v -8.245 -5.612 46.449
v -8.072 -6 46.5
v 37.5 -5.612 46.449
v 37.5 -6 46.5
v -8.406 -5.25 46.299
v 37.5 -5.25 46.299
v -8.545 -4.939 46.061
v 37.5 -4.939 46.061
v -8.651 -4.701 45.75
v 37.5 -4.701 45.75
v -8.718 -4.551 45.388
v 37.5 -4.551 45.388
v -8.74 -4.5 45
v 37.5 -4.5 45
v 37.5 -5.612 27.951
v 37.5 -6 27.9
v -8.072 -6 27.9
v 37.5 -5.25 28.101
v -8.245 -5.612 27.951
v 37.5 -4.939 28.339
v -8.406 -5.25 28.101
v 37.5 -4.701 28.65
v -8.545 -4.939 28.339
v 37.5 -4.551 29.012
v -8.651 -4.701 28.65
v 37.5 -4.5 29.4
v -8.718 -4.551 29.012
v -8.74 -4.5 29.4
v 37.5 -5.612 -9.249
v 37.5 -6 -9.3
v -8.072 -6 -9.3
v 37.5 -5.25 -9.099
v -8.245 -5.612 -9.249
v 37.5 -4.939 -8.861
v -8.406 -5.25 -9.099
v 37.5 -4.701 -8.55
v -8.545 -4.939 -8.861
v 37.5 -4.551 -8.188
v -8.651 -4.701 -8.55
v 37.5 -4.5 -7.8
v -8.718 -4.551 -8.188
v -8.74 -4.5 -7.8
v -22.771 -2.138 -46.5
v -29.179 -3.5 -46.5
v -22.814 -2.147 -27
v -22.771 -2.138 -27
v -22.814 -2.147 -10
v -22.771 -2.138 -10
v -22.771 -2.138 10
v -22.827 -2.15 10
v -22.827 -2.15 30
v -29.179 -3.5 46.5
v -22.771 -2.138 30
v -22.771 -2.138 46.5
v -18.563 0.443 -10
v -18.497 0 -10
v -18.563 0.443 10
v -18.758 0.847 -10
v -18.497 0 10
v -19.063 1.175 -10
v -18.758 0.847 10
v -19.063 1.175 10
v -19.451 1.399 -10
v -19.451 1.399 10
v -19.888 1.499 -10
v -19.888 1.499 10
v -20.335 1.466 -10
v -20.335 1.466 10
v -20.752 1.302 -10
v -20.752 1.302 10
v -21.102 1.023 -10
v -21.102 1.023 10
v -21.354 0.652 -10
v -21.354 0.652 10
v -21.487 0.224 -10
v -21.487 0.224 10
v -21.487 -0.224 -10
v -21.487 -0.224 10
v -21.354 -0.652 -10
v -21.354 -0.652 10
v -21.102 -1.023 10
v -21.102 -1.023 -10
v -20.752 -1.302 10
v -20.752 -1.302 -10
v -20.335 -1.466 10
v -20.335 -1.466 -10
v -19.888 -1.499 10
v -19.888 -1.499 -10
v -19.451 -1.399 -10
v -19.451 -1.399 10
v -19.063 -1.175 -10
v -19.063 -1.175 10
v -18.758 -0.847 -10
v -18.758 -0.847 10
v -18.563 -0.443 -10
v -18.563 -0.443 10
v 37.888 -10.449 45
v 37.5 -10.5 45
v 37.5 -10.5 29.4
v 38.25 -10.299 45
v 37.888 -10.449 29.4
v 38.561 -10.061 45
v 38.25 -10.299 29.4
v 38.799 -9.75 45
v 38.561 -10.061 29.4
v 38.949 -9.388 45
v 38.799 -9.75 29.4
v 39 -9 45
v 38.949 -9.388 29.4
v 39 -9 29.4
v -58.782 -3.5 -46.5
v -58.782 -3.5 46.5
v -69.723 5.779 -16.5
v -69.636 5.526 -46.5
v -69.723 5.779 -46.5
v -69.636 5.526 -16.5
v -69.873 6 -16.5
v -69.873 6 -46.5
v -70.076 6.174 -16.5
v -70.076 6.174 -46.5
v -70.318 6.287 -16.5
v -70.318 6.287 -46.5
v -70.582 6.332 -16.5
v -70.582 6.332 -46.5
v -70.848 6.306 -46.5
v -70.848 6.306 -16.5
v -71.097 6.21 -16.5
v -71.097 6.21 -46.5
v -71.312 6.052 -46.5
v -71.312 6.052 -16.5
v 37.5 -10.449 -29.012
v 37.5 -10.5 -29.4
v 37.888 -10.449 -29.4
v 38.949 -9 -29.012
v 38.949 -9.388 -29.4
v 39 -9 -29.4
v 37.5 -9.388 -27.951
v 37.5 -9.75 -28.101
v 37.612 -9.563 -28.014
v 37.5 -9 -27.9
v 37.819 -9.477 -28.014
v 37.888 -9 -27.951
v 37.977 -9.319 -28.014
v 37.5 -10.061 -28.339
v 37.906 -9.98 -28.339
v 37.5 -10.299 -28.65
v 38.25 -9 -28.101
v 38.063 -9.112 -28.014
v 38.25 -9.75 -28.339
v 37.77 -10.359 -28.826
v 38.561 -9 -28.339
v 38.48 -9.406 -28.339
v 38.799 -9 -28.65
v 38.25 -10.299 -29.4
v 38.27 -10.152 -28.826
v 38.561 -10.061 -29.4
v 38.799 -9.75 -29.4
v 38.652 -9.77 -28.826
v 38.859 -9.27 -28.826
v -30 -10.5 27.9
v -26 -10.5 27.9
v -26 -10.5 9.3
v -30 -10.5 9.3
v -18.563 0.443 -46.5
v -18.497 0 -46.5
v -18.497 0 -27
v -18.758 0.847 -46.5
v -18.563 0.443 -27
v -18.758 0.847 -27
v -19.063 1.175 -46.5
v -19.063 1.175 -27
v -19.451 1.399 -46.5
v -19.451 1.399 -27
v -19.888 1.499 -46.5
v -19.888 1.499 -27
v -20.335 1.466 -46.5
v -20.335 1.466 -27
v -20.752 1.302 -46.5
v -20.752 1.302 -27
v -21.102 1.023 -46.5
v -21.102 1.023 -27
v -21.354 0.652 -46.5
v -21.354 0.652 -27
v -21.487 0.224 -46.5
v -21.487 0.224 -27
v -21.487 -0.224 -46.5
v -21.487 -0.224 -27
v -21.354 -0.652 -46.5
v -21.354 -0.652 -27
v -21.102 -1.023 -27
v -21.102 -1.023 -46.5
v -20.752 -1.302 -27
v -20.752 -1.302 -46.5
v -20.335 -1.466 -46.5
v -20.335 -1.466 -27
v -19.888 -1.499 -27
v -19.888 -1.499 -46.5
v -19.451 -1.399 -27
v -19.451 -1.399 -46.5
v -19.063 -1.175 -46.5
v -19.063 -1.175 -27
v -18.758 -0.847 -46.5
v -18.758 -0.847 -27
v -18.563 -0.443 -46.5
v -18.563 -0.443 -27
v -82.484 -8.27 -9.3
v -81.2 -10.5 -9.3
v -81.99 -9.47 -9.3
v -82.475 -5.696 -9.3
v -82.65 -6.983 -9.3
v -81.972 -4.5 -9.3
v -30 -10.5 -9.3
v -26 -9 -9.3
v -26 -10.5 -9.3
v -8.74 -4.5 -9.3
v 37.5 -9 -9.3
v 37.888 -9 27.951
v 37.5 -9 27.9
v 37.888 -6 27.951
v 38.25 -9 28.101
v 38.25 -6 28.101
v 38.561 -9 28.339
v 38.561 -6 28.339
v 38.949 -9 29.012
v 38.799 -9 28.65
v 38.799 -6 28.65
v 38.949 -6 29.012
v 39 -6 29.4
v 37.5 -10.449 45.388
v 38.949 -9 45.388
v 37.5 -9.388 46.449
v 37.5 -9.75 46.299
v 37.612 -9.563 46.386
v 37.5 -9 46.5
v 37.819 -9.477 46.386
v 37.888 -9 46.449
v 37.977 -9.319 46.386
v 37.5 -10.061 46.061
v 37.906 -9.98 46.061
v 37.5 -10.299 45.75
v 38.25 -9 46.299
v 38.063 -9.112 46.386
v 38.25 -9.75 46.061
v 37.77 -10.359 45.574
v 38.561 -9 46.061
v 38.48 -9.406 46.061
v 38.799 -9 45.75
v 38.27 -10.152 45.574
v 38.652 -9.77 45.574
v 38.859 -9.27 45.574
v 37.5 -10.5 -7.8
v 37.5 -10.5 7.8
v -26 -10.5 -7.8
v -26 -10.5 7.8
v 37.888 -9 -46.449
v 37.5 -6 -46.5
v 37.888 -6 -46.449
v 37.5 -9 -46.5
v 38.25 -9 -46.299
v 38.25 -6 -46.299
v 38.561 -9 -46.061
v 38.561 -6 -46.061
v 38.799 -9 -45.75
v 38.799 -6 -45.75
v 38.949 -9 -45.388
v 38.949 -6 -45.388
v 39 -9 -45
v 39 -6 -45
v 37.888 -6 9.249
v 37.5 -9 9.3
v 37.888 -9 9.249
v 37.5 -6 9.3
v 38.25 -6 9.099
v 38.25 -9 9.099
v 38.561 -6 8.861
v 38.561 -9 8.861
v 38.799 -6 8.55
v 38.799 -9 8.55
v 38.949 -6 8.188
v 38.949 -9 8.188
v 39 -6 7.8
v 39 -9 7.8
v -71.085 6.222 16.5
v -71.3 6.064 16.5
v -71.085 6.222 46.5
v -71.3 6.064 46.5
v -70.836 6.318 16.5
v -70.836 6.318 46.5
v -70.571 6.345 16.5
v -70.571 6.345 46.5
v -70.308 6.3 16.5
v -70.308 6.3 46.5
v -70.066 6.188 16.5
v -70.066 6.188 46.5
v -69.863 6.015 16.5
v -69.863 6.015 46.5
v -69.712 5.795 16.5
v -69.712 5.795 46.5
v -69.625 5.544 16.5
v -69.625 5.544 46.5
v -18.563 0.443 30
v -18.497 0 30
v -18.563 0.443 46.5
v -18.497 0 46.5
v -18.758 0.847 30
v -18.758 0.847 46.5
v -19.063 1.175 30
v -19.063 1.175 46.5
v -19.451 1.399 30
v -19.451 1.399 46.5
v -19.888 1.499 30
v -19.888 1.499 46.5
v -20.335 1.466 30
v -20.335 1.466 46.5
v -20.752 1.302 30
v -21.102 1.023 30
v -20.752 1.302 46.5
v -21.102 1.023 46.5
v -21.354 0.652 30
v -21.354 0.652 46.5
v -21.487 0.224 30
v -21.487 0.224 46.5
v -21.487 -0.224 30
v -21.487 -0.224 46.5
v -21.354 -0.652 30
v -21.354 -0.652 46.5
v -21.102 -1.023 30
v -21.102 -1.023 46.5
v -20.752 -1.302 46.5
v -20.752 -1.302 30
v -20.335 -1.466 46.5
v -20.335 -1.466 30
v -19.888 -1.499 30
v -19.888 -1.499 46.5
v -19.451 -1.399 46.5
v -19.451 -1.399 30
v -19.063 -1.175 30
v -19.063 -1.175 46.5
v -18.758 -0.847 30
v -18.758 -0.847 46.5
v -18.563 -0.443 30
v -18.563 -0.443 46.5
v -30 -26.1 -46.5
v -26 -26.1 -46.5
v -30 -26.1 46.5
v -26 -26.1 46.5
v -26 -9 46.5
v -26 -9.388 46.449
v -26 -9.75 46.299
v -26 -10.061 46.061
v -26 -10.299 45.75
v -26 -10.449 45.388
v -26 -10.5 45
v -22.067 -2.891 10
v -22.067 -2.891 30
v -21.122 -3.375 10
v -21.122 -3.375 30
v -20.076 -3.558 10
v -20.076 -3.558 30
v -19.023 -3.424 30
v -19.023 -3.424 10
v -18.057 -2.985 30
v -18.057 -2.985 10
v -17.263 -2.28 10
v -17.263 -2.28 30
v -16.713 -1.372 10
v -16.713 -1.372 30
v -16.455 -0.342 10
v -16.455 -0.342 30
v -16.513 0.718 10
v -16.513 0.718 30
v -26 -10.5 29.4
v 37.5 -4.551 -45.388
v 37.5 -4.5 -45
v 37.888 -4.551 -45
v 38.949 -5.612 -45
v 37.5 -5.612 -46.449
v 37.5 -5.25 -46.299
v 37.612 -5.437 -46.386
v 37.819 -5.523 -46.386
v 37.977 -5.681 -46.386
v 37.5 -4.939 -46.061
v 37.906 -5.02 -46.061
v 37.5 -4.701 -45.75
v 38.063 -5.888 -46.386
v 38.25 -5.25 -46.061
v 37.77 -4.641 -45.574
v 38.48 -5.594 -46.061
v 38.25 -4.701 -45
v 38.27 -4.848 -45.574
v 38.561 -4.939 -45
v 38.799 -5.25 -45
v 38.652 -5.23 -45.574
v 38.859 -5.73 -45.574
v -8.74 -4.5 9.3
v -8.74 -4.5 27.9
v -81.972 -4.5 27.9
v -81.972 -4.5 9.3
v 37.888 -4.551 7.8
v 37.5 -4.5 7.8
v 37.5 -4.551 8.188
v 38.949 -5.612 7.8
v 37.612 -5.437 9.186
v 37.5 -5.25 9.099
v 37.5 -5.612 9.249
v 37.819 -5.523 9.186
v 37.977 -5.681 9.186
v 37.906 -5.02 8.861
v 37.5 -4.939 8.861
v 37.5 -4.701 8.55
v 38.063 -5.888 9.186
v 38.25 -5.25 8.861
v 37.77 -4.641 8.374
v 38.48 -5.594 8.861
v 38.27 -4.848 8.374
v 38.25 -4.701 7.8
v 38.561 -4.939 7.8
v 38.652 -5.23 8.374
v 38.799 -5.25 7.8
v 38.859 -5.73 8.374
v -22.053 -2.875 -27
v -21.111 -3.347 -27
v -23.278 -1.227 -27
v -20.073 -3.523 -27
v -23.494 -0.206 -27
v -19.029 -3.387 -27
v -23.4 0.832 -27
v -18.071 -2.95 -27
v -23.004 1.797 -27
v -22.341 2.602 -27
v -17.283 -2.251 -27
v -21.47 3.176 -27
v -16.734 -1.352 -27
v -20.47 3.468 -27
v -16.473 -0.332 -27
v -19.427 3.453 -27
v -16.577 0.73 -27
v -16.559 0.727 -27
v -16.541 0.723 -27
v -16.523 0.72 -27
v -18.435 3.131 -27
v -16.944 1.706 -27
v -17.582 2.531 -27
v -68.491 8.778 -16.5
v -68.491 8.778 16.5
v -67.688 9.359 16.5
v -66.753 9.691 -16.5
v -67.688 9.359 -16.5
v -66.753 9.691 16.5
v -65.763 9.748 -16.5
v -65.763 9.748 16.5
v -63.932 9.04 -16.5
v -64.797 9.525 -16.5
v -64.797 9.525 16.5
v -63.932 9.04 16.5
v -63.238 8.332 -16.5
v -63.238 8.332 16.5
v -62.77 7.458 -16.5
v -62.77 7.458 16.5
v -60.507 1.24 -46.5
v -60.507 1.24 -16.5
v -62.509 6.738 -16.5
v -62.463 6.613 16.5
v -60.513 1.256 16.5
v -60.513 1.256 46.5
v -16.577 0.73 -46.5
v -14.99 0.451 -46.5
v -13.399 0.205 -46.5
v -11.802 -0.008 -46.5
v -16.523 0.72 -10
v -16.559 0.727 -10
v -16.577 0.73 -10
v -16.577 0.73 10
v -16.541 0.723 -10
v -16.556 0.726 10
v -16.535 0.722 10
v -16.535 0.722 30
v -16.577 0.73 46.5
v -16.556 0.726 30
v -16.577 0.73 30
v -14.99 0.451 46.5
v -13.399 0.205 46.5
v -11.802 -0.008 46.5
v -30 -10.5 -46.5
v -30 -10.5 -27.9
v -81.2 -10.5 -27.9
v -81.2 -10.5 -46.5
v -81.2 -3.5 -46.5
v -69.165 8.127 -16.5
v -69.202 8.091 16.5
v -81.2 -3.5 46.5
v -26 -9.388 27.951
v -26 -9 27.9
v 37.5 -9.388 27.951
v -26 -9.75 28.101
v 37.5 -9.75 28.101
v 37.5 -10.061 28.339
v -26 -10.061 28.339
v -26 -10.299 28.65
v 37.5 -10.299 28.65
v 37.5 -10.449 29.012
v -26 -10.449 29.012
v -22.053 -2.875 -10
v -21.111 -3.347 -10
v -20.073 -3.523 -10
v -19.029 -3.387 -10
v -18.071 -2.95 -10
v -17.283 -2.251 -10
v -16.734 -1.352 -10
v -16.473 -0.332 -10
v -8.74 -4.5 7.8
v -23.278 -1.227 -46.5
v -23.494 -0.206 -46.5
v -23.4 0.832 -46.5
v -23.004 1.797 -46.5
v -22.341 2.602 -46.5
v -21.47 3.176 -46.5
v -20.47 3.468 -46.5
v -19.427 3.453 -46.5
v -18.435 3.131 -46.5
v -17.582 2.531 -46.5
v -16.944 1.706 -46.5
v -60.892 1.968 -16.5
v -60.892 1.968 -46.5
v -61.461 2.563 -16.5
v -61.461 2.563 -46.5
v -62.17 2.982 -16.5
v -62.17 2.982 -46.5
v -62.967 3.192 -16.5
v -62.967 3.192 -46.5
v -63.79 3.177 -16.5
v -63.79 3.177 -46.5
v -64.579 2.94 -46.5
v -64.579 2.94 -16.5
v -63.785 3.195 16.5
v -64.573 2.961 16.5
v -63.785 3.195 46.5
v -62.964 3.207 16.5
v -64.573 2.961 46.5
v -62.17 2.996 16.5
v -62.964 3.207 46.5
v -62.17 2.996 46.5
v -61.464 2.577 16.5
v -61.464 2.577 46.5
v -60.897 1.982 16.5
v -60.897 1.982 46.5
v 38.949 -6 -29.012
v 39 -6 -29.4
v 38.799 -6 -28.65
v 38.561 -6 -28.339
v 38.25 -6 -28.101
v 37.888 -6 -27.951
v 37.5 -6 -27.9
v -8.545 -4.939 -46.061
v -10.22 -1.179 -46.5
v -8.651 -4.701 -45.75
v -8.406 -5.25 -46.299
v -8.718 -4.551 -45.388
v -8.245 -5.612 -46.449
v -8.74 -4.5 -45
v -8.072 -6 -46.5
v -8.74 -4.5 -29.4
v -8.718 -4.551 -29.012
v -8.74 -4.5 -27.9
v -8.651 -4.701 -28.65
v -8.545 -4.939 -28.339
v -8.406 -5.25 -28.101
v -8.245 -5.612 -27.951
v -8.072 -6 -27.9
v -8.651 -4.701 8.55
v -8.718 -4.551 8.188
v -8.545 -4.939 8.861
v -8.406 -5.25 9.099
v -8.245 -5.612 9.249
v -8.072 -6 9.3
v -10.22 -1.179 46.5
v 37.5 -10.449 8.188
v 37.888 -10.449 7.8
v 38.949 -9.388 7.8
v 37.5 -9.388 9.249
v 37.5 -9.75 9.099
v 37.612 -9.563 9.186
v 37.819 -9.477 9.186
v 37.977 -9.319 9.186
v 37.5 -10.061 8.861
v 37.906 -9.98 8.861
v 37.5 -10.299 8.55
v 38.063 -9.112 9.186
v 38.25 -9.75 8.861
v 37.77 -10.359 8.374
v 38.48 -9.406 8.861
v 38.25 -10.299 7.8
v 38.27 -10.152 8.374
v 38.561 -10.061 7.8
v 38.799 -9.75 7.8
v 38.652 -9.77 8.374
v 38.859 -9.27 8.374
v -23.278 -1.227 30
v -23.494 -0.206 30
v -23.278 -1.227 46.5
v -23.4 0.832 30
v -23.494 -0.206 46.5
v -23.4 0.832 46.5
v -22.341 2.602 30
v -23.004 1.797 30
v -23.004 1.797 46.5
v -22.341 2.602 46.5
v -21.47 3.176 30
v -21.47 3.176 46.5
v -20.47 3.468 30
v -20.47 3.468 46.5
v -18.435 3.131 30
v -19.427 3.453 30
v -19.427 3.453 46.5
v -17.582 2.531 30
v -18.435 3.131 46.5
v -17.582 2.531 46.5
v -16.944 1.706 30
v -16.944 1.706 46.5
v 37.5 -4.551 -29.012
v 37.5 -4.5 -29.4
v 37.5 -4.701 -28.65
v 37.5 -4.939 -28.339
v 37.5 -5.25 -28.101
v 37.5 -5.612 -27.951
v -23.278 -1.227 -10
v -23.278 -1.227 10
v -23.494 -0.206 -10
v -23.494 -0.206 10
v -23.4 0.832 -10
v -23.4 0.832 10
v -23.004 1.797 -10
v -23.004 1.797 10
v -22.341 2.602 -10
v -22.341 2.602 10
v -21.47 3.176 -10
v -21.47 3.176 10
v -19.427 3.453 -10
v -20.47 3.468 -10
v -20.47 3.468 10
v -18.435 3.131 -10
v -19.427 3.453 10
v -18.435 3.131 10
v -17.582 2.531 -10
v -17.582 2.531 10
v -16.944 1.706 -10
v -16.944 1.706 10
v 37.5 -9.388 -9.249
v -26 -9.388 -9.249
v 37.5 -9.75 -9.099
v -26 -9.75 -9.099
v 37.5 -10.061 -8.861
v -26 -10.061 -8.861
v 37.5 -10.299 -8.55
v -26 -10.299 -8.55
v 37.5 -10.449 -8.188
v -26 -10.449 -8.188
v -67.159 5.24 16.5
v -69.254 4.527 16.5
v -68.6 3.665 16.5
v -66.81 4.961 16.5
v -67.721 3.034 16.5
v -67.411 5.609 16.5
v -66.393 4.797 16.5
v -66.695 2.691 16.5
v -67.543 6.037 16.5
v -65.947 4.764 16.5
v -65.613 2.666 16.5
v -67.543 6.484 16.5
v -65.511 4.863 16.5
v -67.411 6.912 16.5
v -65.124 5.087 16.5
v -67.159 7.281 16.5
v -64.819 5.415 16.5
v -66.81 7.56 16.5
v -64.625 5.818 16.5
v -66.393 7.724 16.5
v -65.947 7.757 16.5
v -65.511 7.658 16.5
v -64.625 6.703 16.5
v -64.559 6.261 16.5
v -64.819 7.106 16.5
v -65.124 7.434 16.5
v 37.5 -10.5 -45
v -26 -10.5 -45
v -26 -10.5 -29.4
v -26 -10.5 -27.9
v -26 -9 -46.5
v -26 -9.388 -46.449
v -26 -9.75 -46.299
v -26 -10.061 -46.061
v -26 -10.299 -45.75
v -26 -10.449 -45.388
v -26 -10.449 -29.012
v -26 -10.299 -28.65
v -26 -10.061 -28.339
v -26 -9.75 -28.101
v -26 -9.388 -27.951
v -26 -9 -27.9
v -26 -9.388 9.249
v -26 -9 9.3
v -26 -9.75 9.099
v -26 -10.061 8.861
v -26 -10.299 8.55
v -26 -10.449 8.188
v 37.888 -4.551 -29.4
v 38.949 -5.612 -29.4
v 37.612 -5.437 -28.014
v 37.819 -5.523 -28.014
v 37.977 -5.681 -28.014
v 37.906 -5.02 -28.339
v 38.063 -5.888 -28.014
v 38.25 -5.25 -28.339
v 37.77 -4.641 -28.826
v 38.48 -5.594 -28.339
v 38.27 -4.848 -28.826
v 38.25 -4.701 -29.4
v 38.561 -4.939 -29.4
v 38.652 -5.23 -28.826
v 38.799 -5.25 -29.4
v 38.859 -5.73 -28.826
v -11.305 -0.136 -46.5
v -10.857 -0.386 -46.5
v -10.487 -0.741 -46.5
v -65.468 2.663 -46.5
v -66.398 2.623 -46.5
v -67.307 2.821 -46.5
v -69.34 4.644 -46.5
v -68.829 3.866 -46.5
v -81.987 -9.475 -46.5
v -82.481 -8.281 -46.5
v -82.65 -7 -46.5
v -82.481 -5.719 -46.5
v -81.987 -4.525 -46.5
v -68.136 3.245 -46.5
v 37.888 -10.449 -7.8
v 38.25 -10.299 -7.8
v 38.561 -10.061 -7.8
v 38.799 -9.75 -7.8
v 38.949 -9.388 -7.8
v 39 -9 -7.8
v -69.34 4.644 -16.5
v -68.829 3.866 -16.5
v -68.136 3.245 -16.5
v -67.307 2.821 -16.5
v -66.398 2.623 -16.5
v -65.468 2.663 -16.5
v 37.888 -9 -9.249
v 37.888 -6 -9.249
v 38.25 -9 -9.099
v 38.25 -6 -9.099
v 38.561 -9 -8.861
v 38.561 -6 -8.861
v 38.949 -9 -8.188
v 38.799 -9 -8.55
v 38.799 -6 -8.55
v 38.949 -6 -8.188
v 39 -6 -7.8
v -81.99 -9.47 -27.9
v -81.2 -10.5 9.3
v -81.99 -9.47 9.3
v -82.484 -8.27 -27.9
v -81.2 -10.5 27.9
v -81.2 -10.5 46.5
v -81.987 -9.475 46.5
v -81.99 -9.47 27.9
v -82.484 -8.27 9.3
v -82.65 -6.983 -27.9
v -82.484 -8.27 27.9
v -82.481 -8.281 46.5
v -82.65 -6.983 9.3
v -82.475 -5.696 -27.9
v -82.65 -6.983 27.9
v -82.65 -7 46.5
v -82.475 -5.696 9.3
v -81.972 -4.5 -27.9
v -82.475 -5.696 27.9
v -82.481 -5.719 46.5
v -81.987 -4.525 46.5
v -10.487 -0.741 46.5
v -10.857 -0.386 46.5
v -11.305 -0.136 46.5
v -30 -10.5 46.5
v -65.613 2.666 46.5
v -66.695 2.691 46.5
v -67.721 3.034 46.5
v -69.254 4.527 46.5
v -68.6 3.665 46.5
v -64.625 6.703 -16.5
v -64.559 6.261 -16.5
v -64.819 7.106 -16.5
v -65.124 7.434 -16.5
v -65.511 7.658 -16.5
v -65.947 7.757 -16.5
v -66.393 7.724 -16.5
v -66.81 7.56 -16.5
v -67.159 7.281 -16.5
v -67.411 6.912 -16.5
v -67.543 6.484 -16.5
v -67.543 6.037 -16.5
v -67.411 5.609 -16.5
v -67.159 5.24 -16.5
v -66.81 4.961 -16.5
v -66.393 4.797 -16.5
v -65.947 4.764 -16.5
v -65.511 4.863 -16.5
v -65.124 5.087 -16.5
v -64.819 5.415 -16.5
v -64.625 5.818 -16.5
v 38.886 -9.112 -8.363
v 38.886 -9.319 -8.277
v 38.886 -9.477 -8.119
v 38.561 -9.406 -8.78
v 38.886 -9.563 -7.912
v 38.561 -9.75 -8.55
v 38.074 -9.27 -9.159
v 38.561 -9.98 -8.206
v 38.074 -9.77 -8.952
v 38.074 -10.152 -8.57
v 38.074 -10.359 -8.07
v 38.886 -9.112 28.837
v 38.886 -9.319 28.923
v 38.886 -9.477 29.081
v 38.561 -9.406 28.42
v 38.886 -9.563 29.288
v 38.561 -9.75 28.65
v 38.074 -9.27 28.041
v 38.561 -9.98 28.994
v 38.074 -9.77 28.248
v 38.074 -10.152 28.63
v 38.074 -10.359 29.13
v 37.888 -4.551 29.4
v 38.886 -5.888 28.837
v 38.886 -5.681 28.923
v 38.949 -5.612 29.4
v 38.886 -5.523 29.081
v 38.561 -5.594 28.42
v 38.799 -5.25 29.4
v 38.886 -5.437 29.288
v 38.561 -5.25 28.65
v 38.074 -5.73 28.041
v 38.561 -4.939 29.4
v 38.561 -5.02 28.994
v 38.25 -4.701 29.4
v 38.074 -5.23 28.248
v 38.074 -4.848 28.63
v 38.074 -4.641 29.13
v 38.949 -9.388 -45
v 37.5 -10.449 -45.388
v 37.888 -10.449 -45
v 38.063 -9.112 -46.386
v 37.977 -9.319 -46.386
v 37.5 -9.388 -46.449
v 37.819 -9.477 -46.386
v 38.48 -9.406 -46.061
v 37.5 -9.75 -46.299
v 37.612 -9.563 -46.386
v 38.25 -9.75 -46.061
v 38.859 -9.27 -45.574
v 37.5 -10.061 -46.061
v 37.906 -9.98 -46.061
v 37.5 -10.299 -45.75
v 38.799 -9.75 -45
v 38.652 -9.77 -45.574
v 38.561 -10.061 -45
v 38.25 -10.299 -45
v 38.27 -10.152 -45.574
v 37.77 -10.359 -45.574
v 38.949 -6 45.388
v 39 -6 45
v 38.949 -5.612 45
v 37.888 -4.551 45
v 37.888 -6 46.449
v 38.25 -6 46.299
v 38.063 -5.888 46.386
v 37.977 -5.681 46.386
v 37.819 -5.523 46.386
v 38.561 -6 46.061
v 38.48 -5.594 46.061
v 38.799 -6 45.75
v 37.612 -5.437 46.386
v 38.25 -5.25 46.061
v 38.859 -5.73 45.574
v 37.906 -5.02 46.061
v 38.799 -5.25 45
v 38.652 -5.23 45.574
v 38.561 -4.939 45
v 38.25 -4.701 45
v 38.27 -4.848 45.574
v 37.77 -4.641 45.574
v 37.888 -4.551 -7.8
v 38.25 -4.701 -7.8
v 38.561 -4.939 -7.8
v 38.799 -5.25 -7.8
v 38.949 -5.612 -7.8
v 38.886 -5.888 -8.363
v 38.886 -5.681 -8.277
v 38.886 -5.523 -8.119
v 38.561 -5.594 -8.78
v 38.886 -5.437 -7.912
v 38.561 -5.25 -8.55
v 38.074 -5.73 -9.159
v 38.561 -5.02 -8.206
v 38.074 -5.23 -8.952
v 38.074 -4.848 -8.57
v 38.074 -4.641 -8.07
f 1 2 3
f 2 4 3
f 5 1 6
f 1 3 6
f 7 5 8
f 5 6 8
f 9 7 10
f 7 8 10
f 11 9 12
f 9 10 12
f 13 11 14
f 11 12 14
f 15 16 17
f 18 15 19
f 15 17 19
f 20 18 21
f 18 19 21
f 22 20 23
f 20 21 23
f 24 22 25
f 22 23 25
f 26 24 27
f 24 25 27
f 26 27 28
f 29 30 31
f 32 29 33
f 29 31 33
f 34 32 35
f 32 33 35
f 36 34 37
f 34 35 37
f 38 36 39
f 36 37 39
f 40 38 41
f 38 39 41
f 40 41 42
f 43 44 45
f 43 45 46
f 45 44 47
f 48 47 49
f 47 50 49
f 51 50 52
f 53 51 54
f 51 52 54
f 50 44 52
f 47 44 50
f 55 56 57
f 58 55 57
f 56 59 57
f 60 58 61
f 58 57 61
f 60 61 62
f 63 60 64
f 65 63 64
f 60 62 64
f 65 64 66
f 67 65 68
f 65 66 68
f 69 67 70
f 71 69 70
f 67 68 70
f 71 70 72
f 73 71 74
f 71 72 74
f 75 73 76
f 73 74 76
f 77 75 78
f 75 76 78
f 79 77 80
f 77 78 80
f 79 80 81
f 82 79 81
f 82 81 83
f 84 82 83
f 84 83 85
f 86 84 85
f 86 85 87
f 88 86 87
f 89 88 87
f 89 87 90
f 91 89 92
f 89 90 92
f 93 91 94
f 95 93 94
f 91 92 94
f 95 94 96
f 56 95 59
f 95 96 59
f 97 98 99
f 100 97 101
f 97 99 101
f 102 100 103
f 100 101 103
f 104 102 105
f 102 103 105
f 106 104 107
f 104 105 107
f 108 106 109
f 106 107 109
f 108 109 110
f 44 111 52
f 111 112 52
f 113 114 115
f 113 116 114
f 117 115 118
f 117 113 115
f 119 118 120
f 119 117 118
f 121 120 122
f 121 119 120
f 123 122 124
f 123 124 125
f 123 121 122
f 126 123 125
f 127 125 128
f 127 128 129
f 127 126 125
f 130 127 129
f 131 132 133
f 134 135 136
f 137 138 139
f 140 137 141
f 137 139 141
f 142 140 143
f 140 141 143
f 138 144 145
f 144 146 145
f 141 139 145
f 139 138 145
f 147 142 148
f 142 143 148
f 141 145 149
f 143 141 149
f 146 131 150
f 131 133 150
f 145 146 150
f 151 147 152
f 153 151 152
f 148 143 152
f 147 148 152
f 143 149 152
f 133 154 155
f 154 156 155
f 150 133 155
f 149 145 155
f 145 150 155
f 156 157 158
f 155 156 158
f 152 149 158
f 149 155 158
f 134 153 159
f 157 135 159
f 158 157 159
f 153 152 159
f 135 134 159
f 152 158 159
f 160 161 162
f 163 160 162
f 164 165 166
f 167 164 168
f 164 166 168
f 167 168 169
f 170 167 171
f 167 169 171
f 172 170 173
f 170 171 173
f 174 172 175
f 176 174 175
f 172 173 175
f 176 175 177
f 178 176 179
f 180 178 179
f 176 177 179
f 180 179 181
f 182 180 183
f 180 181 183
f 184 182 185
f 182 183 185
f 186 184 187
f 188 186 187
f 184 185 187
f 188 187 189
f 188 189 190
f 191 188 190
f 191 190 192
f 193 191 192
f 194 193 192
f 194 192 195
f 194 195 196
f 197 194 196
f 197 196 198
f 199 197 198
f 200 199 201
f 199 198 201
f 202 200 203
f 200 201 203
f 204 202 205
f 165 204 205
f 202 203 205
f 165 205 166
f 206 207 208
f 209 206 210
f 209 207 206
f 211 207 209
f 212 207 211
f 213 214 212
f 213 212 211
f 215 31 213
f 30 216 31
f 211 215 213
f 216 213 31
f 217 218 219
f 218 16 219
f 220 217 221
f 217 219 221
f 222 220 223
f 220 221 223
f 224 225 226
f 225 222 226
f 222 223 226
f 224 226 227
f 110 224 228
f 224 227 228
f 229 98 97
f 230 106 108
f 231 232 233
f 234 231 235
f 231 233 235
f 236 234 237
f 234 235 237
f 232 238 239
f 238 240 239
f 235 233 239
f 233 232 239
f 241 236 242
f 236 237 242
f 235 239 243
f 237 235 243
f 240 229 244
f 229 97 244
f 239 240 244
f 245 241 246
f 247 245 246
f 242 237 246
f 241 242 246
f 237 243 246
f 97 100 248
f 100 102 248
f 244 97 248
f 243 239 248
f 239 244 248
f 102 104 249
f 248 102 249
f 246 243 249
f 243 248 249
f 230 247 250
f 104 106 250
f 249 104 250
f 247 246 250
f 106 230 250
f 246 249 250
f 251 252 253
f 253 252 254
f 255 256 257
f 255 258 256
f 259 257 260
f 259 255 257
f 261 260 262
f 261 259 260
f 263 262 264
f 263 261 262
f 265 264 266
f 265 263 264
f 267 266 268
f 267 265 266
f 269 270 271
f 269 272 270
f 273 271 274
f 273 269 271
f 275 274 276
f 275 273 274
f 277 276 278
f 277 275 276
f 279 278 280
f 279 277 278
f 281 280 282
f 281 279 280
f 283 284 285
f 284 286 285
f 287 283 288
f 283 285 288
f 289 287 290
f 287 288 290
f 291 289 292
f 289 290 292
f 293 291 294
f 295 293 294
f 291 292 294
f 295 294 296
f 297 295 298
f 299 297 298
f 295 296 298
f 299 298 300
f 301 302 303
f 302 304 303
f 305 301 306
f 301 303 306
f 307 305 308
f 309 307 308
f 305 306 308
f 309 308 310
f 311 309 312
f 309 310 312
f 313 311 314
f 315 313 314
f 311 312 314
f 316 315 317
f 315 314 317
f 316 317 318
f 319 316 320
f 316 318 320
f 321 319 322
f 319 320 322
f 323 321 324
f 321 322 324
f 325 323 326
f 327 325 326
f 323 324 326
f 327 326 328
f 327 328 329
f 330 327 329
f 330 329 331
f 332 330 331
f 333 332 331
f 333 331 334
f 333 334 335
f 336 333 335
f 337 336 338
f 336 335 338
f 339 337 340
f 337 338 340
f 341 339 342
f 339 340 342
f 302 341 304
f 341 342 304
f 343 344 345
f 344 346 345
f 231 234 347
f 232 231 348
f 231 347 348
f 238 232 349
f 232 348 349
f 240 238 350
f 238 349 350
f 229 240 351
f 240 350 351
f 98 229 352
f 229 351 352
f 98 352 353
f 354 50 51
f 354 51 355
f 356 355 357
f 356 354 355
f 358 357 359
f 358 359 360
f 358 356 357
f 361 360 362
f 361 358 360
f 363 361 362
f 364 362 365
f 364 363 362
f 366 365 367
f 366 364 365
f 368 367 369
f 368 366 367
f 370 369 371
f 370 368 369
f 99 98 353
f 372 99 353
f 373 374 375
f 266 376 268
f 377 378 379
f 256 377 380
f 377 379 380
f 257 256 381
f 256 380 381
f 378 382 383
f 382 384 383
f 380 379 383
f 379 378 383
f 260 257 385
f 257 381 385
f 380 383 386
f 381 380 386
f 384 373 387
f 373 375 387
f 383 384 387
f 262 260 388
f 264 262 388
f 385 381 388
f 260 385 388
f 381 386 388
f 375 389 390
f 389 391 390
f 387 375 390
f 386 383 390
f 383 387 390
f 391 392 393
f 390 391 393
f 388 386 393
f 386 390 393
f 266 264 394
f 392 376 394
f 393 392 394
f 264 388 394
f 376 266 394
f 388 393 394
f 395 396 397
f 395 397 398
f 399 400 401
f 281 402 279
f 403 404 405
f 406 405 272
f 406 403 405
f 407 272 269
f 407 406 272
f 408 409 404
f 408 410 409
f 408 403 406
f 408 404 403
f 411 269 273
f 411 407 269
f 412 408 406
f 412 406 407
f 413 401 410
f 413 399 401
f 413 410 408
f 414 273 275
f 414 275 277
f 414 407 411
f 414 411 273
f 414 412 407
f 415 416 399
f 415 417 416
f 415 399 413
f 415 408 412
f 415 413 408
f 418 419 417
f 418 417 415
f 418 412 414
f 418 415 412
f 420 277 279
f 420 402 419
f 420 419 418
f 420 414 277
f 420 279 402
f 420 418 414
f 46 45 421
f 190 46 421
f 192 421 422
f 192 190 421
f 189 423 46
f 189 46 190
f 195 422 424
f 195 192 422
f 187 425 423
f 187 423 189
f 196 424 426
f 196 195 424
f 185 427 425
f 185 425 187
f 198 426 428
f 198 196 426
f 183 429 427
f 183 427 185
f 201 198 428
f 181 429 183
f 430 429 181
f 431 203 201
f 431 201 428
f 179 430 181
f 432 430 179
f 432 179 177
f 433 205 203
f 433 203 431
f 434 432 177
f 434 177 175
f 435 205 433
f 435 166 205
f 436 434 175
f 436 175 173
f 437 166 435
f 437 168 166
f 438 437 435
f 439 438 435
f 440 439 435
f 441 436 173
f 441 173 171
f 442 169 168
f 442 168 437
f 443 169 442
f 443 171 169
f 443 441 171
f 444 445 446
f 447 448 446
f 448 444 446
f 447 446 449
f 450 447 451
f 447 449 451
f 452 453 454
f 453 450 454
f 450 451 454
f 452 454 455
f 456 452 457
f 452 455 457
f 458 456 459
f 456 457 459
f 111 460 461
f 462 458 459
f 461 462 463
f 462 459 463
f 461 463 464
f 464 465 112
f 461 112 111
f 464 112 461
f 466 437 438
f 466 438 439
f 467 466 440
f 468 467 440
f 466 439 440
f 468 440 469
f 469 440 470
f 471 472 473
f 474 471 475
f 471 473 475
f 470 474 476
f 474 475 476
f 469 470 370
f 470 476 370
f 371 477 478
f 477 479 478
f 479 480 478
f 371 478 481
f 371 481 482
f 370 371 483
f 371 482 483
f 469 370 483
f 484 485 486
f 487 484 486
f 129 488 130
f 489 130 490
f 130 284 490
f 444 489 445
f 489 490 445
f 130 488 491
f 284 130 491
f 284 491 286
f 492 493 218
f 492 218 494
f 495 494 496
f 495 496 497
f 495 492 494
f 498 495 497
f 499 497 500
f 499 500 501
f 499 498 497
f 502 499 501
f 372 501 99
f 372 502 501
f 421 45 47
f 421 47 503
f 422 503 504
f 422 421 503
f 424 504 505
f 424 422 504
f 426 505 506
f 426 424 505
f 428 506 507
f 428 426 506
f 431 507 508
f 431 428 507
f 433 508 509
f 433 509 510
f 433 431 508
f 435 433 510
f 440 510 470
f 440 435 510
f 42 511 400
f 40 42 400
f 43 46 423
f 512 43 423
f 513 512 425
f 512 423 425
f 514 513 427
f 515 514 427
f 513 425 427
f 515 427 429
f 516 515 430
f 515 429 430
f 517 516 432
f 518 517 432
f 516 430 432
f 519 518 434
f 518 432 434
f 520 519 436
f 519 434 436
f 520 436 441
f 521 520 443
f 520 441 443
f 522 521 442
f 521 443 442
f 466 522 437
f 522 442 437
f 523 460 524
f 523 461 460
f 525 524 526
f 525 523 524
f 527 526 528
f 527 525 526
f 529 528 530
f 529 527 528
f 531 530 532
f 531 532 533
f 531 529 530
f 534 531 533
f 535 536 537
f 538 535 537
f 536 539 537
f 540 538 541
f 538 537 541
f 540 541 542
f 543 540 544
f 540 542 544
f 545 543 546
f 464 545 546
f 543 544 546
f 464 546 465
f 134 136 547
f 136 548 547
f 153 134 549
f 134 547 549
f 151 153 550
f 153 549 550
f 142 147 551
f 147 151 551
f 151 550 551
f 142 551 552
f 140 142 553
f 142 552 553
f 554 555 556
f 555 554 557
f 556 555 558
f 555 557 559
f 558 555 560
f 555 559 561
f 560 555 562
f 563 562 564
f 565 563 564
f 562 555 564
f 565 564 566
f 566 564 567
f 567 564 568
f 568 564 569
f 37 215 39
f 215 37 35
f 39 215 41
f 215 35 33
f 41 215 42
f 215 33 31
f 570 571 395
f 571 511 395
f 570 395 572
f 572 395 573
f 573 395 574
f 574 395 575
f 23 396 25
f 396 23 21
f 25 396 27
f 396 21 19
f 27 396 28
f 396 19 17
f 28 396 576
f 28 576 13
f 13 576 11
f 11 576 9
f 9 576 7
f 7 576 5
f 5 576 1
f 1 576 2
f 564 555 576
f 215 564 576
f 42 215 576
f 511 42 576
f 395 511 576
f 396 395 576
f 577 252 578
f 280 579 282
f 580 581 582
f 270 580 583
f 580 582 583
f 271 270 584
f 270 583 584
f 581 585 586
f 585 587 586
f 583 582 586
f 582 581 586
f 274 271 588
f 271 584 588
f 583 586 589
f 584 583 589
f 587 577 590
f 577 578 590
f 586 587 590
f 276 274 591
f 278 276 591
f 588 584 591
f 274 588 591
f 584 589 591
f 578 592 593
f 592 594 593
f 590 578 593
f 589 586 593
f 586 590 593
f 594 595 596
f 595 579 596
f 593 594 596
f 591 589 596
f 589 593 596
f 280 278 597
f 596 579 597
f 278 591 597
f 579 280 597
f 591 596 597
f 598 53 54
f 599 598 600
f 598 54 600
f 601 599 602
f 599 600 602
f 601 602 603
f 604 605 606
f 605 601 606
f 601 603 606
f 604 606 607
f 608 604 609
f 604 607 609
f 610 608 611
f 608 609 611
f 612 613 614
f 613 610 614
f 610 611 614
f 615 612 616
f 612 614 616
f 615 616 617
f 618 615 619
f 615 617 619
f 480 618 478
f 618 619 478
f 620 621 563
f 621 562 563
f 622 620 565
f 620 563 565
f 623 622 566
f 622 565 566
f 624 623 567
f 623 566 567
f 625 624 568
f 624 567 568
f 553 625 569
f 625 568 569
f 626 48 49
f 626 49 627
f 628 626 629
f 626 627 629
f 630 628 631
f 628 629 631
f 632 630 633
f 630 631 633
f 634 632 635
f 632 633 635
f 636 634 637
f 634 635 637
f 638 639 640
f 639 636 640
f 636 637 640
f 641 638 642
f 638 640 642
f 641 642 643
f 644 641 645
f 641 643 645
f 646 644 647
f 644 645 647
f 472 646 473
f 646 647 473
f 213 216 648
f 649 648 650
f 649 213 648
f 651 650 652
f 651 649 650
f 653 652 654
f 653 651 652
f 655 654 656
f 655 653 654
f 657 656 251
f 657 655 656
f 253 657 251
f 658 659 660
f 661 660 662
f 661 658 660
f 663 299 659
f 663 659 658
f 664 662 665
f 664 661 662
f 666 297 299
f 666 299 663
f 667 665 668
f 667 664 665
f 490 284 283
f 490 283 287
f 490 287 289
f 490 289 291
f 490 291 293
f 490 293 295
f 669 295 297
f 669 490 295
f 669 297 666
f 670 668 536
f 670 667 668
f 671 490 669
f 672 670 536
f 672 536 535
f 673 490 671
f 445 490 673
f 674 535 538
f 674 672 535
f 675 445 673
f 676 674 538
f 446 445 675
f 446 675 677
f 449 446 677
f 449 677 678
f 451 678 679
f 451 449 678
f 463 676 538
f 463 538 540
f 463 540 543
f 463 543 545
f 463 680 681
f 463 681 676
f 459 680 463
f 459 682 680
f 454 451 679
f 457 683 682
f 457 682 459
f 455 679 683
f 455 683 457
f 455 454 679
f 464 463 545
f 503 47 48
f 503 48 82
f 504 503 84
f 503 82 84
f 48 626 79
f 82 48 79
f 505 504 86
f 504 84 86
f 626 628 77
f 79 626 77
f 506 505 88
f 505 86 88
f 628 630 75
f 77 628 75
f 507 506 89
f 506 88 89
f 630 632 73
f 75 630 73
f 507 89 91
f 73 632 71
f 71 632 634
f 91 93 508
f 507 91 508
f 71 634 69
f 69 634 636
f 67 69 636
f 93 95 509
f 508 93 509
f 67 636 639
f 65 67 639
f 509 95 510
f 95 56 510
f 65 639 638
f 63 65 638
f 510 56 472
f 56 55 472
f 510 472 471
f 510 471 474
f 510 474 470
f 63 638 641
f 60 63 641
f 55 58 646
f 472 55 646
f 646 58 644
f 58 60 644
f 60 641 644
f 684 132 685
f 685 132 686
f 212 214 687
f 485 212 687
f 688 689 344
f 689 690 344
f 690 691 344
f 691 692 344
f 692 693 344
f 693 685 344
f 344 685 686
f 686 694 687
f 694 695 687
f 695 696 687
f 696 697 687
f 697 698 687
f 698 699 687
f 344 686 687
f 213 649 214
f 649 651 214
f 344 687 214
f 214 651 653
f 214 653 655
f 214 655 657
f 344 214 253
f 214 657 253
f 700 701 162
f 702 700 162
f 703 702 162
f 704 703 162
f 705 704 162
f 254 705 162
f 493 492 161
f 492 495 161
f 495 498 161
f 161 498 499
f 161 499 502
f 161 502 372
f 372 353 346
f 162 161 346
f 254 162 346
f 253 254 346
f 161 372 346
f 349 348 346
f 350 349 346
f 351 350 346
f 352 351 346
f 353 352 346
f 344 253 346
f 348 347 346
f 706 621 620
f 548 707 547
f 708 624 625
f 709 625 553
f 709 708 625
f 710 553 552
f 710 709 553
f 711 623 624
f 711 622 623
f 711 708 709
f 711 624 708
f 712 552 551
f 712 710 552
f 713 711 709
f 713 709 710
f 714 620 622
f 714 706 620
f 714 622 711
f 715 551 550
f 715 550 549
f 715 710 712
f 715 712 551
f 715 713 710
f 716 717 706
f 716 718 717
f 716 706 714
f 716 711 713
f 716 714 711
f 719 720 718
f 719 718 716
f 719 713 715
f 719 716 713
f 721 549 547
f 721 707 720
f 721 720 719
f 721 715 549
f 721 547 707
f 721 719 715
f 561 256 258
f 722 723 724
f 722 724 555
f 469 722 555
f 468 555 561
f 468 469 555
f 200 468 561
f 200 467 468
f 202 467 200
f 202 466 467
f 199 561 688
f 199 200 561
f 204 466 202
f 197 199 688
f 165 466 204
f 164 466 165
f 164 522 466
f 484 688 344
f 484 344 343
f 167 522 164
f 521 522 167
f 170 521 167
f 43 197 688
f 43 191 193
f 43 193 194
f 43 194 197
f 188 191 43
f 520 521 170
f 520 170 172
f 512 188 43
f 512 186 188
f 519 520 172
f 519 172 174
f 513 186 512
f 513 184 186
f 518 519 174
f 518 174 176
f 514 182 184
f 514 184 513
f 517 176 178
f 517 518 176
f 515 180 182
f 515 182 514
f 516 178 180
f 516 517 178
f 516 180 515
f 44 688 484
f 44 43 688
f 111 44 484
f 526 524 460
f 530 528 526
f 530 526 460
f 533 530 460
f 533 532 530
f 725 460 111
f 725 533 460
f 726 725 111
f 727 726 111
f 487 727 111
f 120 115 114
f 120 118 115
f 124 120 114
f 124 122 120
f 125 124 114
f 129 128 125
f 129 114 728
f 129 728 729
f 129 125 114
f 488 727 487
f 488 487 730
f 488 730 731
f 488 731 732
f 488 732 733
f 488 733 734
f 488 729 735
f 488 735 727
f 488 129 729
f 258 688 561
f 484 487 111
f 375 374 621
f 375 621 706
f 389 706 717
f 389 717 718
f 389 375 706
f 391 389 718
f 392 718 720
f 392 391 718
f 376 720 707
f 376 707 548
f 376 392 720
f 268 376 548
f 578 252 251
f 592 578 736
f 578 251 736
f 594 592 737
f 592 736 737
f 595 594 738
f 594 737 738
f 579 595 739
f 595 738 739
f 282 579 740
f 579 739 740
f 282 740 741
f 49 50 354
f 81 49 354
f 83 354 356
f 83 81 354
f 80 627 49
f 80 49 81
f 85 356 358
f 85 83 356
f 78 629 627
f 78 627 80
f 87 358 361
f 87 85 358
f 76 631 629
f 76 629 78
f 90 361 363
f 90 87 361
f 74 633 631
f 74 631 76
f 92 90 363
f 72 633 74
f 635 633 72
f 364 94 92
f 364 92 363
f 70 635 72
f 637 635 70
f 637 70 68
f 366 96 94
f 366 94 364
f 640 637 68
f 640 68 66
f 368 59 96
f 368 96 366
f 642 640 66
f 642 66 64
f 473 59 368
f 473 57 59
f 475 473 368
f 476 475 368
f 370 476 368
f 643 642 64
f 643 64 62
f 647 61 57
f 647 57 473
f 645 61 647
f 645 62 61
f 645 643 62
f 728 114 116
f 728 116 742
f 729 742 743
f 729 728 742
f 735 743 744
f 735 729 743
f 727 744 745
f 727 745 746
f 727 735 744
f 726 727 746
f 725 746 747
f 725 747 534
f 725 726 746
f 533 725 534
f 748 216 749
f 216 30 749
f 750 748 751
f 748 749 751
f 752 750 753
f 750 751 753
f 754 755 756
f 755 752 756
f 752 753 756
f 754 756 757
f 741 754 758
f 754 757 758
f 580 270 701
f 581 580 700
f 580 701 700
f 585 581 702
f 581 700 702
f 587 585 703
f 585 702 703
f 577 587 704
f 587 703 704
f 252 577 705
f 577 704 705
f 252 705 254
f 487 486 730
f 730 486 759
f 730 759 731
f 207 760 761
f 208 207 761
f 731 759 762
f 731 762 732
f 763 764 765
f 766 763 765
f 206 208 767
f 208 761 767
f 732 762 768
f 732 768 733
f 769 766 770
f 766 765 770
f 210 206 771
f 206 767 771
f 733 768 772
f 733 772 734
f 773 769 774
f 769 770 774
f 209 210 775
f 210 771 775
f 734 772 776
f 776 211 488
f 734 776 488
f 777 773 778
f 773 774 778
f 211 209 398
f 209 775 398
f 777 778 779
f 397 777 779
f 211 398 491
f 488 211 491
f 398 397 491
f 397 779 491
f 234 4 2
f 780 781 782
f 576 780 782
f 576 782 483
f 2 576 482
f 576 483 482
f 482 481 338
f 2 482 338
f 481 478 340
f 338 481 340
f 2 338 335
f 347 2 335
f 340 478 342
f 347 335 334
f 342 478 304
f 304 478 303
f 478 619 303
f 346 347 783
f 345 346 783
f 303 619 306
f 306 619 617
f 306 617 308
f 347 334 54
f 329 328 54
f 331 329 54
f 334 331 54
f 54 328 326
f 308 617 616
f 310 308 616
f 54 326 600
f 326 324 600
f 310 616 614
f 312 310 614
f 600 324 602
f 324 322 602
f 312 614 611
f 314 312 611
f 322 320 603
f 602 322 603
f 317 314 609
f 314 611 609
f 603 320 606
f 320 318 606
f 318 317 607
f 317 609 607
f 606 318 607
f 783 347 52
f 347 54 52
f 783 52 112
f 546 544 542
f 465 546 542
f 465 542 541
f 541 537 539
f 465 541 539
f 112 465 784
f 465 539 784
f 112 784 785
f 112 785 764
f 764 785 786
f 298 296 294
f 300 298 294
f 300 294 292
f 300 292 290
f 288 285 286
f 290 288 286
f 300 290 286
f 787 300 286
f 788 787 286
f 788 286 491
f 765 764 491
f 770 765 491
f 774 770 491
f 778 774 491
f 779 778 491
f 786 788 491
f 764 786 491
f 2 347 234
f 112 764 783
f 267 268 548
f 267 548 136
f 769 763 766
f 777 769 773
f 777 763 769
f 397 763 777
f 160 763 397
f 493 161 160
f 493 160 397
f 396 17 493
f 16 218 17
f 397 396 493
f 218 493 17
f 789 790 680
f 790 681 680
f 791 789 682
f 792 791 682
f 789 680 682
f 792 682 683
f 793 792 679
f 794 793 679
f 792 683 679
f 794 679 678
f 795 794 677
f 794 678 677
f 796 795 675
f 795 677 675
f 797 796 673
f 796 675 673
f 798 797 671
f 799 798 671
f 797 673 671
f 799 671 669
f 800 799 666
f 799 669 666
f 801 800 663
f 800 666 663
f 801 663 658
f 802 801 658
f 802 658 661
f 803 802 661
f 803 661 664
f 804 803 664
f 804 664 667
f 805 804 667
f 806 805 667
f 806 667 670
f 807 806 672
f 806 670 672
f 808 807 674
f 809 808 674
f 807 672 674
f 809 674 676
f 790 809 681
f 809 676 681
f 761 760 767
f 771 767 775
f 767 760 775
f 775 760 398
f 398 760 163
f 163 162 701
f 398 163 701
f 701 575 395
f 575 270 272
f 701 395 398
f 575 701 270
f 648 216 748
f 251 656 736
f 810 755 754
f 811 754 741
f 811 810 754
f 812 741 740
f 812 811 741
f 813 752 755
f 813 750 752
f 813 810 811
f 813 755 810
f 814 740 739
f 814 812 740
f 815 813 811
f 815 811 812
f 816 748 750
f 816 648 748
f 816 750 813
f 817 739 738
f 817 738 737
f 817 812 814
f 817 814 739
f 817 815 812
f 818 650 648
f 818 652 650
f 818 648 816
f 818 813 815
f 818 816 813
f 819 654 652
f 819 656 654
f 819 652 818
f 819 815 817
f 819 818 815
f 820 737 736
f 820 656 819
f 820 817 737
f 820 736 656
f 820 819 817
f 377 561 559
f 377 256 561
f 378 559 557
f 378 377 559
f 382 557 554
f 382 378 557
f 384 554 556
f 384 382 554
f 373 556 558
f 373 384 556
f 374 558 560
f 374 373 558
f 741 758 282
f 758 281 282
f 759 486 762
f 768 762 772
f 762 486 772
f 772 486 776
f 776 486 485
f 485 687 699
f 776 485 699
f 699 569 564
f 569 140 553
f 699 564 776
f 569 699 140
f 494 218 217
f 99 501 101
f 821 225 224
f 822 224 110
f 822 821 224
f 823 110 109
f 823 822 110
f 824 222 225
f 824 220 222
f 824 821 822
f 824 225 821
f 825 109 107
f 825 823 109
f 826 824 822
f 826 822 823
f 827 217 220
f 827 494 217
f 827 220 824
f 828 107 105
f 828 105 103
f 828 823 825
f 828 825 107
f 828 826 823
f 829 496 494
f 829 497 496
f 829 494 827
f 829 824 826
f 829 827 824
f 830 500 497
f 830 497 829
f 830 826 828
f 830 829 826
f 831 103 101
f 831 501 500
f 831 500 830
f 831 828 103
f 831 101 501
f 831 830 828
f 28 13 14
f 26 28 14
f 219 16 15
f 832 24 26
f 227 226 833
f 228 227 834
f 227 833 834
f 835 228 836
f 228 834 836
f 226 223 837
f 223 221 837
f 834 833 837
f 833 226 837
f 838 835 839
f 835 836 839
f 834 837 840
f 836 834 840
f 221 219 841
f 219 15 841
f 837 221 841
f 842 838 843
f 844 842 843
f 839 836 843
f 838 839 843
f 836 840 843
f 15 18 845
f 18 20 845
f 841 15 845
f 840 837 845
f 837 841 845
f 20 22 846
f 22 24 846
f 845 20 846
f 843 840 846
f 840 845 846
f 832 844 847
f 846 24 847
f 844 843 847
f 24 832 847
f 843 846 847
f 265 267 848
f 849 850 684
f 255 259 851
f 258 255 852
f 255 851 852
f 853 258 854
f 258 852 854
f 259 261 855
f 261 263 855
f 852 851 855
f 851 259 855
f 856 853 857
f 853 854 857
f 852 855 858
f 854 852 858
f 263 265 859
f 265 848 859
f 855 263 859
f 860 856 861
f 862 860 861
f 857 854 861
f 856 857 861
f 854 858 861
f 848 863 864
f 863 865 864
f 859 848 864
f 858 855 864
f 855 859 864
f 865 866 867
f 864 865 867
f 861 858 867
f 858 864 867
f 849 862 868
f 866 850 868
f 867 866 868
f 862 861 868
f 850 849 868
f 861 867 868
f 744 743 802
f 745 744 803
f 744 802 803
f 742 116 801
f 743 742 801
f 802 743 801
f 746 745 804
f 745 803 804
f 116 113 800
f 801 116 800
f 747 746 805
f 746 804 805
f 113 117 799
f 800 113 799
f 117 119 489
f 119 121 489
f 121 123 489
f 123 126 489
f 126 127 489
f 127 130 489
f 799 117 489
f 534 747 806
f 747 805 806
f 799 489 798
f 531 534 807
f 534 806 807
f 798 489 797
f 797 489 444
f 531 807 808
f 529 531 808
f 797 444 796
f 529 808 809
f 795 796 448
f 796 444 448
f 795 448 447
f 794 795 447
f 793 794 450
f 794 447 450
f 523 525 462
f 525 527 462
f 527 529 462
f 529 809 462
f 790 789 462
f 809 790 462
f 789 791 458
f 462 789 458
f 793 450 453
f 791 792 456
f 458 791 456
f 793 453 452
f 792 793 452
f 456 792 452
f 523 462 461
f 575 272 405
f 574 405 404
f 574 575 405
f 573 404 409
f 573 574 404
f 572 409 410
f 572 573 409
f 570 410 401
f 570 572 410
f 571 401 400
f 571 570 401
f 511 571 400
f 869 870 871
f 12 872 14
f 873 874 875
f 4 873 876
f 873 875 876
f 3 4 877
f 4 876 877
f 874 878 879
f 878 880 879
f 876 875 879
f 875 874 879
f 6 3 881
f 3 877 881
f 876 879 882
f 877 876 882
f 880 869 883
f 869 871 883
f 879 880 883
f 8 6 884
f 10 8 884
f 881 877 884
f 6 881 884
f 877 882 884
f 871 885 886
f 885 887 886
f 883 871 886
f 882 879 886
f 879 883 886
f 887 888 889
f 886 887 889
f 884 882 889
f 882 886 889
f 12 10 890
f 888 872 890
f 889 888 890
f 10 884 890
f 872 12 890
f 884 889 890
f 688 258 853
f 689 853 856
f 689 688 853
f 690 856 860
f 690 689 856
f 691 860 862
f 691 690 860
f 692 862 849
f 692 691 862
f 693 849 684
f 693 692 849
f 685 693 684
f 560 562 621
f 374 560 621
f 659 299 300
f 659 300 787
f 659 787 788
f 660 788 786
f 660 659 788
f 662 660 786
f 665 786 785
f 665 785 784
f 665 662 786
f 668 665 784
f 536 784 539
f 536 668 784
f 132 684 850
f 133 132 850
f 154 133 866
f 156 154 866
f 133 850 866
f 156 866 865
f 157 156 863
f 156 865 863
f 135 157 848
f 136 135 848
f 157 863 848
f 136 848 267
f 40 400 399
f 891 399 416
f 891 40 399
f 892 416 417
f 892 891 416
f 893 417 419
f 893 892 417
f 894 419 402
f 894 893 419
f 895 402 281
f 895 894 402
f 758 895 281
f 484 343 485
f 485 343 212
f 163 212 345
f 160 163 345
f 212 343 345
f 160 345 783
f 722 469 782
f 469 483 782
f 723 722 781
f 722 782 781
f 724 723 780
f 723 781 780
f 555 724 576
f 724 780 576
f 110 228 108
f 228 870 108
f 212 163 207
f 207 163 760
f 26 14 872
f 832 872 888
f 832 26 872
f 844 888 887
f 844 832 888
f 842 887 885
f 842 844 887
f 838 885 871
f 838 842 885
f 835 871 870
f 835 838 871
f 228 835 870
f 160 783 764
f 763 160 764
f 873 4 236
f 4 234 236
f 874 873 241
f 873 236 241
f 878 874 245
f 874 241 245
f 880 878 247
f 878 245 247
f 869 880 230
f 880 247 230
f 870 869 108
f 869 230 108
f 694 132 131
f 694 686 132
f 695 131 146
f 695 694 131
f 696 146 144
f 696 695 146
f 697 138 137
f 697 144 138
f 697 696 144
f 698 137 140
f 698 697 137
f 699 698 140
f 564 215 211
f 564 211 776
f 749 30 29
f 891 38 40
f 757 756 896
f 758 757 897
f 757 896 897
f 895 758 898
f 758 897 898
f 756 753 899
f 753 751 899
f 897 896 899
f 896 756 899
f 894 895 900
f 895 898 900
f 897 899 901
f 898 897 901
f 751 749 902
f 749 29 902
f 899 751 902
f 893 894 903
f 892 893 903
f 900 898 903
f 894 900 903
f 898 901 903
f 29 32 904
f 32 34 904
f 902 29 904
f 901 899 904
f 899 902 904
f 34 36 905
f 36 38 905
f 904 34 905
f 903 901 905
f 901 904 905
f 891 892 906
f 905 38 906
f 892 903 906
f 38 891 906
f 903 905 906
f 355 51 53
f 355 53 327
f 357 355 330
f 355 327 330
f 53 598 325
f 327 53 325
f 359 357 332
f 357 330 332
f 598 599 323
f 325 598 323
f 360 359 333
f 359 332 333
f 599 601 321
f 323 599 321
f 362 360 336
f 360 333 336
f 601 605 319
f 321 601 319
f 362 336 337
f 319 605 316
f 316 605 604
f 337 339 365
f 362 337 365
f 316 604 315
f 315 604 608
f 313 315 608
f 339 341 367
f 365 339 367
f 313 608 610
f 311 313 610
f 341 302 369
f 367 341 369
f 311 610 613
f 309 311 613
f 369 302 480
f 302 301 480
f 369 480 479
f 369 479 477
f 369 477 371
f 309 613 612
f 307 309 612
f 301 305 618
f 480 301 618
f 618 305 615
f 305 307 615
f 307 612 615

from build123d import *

# Parameters (mm, degrees)
SALIENTE_EXTRUIR2_DEPTH   = 46.5
CROQUIS3_R                = 1.500774296
CROQUIS3_R_2              = 1.503322105
CORTAR_EXTRUIR1_DEPTH     = 46.5
CORTAR_EXTRUIR2_START     = 16.5
CORTAR_EXTRUIR2_OUTLINE_R = 1.500774296
CORTAR_EXTRUIR2_DEPTH     = 30
REDONDEO2_R               = 3
CORTAR_EXTRUIR3_START     = -46.5
CORTAR_EXTRUIR3_OUTLINE_R = 1.500774296
CORTAR_EXTRUIR3_DEPTH     = 30
REDONDEO3_R               = 3
CORTAR_EXTRUIR4_START     = 10
CORTAR_EXTRUIR4_OUTLINE_R = 1.503322105
CORTAR_EXTRUIR4_DEPTH     = 20
CORTAR_EXTRUIR5_START     = -27
CORTAR_EXTRUIR5_OUTLINE_R = 1.503322105
CORTAR_EXTRUIR5_DEPTH     = 17
REDONDEO4_R               = 1
CROQUIS4_W                = 18.6
CROQUIS4_H                = 6
CORTAR_EXTRUIR6_DEPTH     = 133.823646461
CROQUIS5_W                = 18.6
CROQUIS5_H                = 6
CORTAR_EXTRUIR7_DEPTH     = 133.823646461
REDONDEO5_R               = 1.5
REDONDEO6_R               = 2


# Read off the part's stored shape, not the designer's step: Cortar-Extruir2, Cortar-Extruir3, Cortar-Extruir4, Cortar-Extruir5
with BuildPart() as part:
    # Croquis1 → Saliente-Extruir2 (new, symmetric)
    with BuildSketch(Plane.XY):
        with BuildLine():
            Line((-10.68367701, -0.137920216), (-8.740480313, -4.5))
            Line((-8.740480313, -4.5), (39, -4.5))
            Line((39, -4.5), (39, -10.5))
            Line((39, -10.5), (-26, -10.5))
            Line((-26, -10.5), (-26, -26.1))
            Line((-26, -26.1), (-30, -26.1))
            Line((-30, -26.1), (-30, -10.5))
            Line((-30, -10.5), (-81.2, -10.5))
            ThreePointArc((-81.2, -10.5), (-82.649747468, -7), (-81.2, -3.5))
            Line((-81.2, -3.5), (-68.491106331, 8.777732226))
            ThreePointArc((-68.491106331, 8.777732226), (-65.272311444, 9.670901246), (-62.770376094, 7.457598075))
            Line((-62.770376094, 7.457598075), (-58.782136556, -3.5))
            Line((-58.782136556, -3.5), (-29.179236041, -3.5))
            Line((-29.179236041, -3.5), (-22.771154479, -2.137920216))
            ThreePointArc((-22.771154479, -2.137920216), (-21.470497358, 3.176104142), (-16.576957377, 0.729917256))
            ThreePointArc((-16.576957377, 0.729917256), (-13.638551951, 0.240078221), (-10.68367701, -0.137920216))
        make_face()
    extrude(amount=SALIENTE_EXTRUIR2_DEPTH, both=True)

    # Croquis3 → Cortar-Extruir1 (cut, symmetric)
    with BuildSketch(Plane.XY):
        with Locations((-66.059300267, 6.260527573)):
            Circle(CROQUIS3_R)
        with Locations((-20, 0)):
            Circle(CROQUIS3_R_2)
    extrude(amount=CORTAR_EXTRUIR1_DEPTH, both=True, mode=Mode.SUBTRACT)

    # Cortar-Extruir2 outline → Cortar-Extruir2 (cut)
    with BuildSketch(Plane.XY.offset(CORTAR_EXTRUIR2_START)):
        with BuildLine():
            Line((-68.491106331, 8.777732226), (-69.201699105, 8.091246996))
            ThreePointArc((-69.201699105, 8.091246996), (-66.848168988, 2.721235528), (-62.462991688, 6.61306636))
            Line((-62.462991688, 6.61306636), (-62.770376094, 7.457598075))
            ThreePointArc((-62.770376094, 7.457598075), (-65.272311444, 9.670901246), (-68.491106331, 8.777732226))
        make_face()
        with Locations((-66.059300267, 6.260527573)):
            Circle(CORTAR_EXTRUIR2_OUTLINE_R, mode=Mode.SUBTRACT)
    extrude(amount=CORTAR_EXTRUIR2_DEPTH, mode=Mode.SUBTRACT)

    # Redondeo2
    redondeo2_edges = [part.edges().sort_by_distance(p)[0] for p in [
        (-62.462991688, 6.61306636, 31.5),
    ]]
    fillet(redondeo2_edges, radius=REDONDEO2_R)

    # Cortar-Extruir3 outline → Cortar-Extruir3 (cut)
    with BuildSketch(Plane.XY.offset(CORTAR_EXTRUIR3_START)):
        with BuildLine():
            ThreePointArc((-69.164573514, 8.127113066), (-66.827048097, 2.685630168), (-62.508602445, 6.738380883))
            Line((-62.508602445, 6.738380883), (-62.770376094, 7.457598075))
            ThreePointArc((-62.770376094, 7.457598075), (-65.272311444, 9.670901246), (-68.491106331, 8.777732226))
            Line((-68.491106331, 8.777732226), (-69.164573514, 8.127113066))
        make_face()
        with Locations((-66.059300267, 6.260527573)):
            Circle(CORTAR_EXTRUIR3_OUTLINE_R, mode=Mode.SUBTRACT)
    extrude(amount=CORTAR_EXTRUIR3_DEPTH, mode=Mode.SUBTRACT)

    # Redondeo3
    redondeo3_edges = [part.edges().sort_by_distance(p)[0] for p in [
        (-62.508602445, 6.738380883, -31.5),
    ]]
    fillet(redondeo3_edges, radius=REDONDEO3_R)

    # Cortar-Extruir4 outline → Cortar-Extruir4 (cut)
    with BuildSketch(Plane.XY.offset(CORTAR_EXTRUIR4_START)):
        with BuildLine():
            Line((-22.771154479, -2.137920216), (-22.827271519, -2.149848262))
            ThreePointArc((-22.827271519, -2.149848262), (-18.523452571, -3.240720775), (-16.513304708, 0.718087877))
            ThreePointArc((-16.513304708, 0.718087877), (-16.545132262, 0.723996005), (-16.576957377, 0.729917256))
            ThreePointArc((-16.576957377, 0.729917256), (-21.470497358, 3.176104142), (-22.771154479, -2.137920216))
        make_face()
        with Locations((-20, 0)):
            Circle(CORTAR_EXTRUIR4_OUTLINE_R, mode=Mode.SUBTRACT)
    extrude(amount=CORTAR_EXTRUIR4_DEPTH, mode=Mode.SUBTRACT)

    # Cortar-Extruir5 outline → Cortar-Extruir5 (cut)
    with BuildSketch(Plane.XY.offset(CORTAR_EXTRUIR5_START)):
        with BuildLine():
            ThreePointArc((-22.813751372, -2.146974465), (-18.533466696, -3.203987987), (-16.523253553, 0.719933216))
            ThreePointArc((-16.523253553, 0.719933216), (-16.550106333, 0.724920565), (-16.576957377, 0.729917256))
            ThreePointArc((-16.576957377, 0.729917256), (-21.470497358, 3.176104142), (-22.771154479, -2.137920216))
            Line((-22.771154479, -2.137920216), (-22.813751372, -2.146974465))
        make_face()
        with Locations((-20, 0)):
            Circle(CORTAR_EXTRUIR5_OUTLINE_R, mode=Mode.SUBTRACT)
    extrude(amount=CORTAR_EXTRUIR5_DEPTH, mode=Mode.SUBTRACT)

    # Redondeo4
    redondeo4_edges = [part.edges().sort_by_distance(p)[0] for p in [
        (-69.201699105, 8.091246996, 31.5),
        (-69.164573514, 8.127113066, -31.5),
    ]]
    fillet(redondeo4_edges, radius=REDONDEO4_R)

    # Croquis4 → Cortar-Extruir6 (cut, through all)
    with BuildSketch(Plane(origin=(39, 0, 0), x_dir=(0, 0, -1), z_dir=(1, 0, 0))):
        with Locations((18.6, -7.5)):
            Rectangle(CROQUIS4_W, CROQUIS4_H)
    extrude(amount=-CORTAR_EXTRUIR6_DEPTH, mode=Mode.SUBTRACT)

    # Croquis5 → Cortar-Extruir7 (cut, through all)
    with BuildSketch(Plane(origin=(39, 0, 0), x_dir=(0, 0, -1), z_dir=(1, 0, 0))):
        with Locations((-18.6, -7.5)):
            Rectangle(CROQUIS5_W, CROQUIS5_H)
    extrude(amount=-CORTAR_EXTRUIR7_DEPTH, mode=Mode.SUBTRACT)

    # Redondeo5
    redondeo5_edges = [part.edges().sort_by_distance(p)[0] for p in [
        (39, -4.5, -37.2),
        (15.129759844, -4.5, -46.5),
        (39, -10.5, -37.2),
        (39, -7.5, -46.5),
        (6.5, -10.5, -46.5),
        (6.5, -10.5, -27.9),
        (15.129759844, -4.5, -27.9),
        (6.5, -10.5, -9.3),
        (15.129759844, -4.5, -9.3),
        (39, -7.5, -27.9),
        (39, -7.5, -9.3),
        (39, -4.5, 0),
        (39, -10.5, 0),
        (6.5, -10.5, 9.3),
        (15.129759844, -4.5, 9.3),
        (6.5, -10.5, 27.9),
        (15.129759844, -4.5, 27.9),
        (39, -7.5, 9.3),
        (39, -7.5, 27.9),
        (39, -4.5, 37.2),
        (39, -10.5, 37.2),
        (6.5, -10.5, 46.5),
        (39, -7.5, 46.5),
        (15.129759844, -4.5, 46.5),
    ]]
    fillet(redondeo5_edges, radius=REDONDEO5_R)

    # Redondeo6
    redondeo6_edges = [part.edges().sort_by_distance(p)[0] for p in [
        (-10.68367701, -0.137920216, 0),
    ]]
    fillet(redondeo6_edges, radius=REDONDEO6_R)


solid = part.part
